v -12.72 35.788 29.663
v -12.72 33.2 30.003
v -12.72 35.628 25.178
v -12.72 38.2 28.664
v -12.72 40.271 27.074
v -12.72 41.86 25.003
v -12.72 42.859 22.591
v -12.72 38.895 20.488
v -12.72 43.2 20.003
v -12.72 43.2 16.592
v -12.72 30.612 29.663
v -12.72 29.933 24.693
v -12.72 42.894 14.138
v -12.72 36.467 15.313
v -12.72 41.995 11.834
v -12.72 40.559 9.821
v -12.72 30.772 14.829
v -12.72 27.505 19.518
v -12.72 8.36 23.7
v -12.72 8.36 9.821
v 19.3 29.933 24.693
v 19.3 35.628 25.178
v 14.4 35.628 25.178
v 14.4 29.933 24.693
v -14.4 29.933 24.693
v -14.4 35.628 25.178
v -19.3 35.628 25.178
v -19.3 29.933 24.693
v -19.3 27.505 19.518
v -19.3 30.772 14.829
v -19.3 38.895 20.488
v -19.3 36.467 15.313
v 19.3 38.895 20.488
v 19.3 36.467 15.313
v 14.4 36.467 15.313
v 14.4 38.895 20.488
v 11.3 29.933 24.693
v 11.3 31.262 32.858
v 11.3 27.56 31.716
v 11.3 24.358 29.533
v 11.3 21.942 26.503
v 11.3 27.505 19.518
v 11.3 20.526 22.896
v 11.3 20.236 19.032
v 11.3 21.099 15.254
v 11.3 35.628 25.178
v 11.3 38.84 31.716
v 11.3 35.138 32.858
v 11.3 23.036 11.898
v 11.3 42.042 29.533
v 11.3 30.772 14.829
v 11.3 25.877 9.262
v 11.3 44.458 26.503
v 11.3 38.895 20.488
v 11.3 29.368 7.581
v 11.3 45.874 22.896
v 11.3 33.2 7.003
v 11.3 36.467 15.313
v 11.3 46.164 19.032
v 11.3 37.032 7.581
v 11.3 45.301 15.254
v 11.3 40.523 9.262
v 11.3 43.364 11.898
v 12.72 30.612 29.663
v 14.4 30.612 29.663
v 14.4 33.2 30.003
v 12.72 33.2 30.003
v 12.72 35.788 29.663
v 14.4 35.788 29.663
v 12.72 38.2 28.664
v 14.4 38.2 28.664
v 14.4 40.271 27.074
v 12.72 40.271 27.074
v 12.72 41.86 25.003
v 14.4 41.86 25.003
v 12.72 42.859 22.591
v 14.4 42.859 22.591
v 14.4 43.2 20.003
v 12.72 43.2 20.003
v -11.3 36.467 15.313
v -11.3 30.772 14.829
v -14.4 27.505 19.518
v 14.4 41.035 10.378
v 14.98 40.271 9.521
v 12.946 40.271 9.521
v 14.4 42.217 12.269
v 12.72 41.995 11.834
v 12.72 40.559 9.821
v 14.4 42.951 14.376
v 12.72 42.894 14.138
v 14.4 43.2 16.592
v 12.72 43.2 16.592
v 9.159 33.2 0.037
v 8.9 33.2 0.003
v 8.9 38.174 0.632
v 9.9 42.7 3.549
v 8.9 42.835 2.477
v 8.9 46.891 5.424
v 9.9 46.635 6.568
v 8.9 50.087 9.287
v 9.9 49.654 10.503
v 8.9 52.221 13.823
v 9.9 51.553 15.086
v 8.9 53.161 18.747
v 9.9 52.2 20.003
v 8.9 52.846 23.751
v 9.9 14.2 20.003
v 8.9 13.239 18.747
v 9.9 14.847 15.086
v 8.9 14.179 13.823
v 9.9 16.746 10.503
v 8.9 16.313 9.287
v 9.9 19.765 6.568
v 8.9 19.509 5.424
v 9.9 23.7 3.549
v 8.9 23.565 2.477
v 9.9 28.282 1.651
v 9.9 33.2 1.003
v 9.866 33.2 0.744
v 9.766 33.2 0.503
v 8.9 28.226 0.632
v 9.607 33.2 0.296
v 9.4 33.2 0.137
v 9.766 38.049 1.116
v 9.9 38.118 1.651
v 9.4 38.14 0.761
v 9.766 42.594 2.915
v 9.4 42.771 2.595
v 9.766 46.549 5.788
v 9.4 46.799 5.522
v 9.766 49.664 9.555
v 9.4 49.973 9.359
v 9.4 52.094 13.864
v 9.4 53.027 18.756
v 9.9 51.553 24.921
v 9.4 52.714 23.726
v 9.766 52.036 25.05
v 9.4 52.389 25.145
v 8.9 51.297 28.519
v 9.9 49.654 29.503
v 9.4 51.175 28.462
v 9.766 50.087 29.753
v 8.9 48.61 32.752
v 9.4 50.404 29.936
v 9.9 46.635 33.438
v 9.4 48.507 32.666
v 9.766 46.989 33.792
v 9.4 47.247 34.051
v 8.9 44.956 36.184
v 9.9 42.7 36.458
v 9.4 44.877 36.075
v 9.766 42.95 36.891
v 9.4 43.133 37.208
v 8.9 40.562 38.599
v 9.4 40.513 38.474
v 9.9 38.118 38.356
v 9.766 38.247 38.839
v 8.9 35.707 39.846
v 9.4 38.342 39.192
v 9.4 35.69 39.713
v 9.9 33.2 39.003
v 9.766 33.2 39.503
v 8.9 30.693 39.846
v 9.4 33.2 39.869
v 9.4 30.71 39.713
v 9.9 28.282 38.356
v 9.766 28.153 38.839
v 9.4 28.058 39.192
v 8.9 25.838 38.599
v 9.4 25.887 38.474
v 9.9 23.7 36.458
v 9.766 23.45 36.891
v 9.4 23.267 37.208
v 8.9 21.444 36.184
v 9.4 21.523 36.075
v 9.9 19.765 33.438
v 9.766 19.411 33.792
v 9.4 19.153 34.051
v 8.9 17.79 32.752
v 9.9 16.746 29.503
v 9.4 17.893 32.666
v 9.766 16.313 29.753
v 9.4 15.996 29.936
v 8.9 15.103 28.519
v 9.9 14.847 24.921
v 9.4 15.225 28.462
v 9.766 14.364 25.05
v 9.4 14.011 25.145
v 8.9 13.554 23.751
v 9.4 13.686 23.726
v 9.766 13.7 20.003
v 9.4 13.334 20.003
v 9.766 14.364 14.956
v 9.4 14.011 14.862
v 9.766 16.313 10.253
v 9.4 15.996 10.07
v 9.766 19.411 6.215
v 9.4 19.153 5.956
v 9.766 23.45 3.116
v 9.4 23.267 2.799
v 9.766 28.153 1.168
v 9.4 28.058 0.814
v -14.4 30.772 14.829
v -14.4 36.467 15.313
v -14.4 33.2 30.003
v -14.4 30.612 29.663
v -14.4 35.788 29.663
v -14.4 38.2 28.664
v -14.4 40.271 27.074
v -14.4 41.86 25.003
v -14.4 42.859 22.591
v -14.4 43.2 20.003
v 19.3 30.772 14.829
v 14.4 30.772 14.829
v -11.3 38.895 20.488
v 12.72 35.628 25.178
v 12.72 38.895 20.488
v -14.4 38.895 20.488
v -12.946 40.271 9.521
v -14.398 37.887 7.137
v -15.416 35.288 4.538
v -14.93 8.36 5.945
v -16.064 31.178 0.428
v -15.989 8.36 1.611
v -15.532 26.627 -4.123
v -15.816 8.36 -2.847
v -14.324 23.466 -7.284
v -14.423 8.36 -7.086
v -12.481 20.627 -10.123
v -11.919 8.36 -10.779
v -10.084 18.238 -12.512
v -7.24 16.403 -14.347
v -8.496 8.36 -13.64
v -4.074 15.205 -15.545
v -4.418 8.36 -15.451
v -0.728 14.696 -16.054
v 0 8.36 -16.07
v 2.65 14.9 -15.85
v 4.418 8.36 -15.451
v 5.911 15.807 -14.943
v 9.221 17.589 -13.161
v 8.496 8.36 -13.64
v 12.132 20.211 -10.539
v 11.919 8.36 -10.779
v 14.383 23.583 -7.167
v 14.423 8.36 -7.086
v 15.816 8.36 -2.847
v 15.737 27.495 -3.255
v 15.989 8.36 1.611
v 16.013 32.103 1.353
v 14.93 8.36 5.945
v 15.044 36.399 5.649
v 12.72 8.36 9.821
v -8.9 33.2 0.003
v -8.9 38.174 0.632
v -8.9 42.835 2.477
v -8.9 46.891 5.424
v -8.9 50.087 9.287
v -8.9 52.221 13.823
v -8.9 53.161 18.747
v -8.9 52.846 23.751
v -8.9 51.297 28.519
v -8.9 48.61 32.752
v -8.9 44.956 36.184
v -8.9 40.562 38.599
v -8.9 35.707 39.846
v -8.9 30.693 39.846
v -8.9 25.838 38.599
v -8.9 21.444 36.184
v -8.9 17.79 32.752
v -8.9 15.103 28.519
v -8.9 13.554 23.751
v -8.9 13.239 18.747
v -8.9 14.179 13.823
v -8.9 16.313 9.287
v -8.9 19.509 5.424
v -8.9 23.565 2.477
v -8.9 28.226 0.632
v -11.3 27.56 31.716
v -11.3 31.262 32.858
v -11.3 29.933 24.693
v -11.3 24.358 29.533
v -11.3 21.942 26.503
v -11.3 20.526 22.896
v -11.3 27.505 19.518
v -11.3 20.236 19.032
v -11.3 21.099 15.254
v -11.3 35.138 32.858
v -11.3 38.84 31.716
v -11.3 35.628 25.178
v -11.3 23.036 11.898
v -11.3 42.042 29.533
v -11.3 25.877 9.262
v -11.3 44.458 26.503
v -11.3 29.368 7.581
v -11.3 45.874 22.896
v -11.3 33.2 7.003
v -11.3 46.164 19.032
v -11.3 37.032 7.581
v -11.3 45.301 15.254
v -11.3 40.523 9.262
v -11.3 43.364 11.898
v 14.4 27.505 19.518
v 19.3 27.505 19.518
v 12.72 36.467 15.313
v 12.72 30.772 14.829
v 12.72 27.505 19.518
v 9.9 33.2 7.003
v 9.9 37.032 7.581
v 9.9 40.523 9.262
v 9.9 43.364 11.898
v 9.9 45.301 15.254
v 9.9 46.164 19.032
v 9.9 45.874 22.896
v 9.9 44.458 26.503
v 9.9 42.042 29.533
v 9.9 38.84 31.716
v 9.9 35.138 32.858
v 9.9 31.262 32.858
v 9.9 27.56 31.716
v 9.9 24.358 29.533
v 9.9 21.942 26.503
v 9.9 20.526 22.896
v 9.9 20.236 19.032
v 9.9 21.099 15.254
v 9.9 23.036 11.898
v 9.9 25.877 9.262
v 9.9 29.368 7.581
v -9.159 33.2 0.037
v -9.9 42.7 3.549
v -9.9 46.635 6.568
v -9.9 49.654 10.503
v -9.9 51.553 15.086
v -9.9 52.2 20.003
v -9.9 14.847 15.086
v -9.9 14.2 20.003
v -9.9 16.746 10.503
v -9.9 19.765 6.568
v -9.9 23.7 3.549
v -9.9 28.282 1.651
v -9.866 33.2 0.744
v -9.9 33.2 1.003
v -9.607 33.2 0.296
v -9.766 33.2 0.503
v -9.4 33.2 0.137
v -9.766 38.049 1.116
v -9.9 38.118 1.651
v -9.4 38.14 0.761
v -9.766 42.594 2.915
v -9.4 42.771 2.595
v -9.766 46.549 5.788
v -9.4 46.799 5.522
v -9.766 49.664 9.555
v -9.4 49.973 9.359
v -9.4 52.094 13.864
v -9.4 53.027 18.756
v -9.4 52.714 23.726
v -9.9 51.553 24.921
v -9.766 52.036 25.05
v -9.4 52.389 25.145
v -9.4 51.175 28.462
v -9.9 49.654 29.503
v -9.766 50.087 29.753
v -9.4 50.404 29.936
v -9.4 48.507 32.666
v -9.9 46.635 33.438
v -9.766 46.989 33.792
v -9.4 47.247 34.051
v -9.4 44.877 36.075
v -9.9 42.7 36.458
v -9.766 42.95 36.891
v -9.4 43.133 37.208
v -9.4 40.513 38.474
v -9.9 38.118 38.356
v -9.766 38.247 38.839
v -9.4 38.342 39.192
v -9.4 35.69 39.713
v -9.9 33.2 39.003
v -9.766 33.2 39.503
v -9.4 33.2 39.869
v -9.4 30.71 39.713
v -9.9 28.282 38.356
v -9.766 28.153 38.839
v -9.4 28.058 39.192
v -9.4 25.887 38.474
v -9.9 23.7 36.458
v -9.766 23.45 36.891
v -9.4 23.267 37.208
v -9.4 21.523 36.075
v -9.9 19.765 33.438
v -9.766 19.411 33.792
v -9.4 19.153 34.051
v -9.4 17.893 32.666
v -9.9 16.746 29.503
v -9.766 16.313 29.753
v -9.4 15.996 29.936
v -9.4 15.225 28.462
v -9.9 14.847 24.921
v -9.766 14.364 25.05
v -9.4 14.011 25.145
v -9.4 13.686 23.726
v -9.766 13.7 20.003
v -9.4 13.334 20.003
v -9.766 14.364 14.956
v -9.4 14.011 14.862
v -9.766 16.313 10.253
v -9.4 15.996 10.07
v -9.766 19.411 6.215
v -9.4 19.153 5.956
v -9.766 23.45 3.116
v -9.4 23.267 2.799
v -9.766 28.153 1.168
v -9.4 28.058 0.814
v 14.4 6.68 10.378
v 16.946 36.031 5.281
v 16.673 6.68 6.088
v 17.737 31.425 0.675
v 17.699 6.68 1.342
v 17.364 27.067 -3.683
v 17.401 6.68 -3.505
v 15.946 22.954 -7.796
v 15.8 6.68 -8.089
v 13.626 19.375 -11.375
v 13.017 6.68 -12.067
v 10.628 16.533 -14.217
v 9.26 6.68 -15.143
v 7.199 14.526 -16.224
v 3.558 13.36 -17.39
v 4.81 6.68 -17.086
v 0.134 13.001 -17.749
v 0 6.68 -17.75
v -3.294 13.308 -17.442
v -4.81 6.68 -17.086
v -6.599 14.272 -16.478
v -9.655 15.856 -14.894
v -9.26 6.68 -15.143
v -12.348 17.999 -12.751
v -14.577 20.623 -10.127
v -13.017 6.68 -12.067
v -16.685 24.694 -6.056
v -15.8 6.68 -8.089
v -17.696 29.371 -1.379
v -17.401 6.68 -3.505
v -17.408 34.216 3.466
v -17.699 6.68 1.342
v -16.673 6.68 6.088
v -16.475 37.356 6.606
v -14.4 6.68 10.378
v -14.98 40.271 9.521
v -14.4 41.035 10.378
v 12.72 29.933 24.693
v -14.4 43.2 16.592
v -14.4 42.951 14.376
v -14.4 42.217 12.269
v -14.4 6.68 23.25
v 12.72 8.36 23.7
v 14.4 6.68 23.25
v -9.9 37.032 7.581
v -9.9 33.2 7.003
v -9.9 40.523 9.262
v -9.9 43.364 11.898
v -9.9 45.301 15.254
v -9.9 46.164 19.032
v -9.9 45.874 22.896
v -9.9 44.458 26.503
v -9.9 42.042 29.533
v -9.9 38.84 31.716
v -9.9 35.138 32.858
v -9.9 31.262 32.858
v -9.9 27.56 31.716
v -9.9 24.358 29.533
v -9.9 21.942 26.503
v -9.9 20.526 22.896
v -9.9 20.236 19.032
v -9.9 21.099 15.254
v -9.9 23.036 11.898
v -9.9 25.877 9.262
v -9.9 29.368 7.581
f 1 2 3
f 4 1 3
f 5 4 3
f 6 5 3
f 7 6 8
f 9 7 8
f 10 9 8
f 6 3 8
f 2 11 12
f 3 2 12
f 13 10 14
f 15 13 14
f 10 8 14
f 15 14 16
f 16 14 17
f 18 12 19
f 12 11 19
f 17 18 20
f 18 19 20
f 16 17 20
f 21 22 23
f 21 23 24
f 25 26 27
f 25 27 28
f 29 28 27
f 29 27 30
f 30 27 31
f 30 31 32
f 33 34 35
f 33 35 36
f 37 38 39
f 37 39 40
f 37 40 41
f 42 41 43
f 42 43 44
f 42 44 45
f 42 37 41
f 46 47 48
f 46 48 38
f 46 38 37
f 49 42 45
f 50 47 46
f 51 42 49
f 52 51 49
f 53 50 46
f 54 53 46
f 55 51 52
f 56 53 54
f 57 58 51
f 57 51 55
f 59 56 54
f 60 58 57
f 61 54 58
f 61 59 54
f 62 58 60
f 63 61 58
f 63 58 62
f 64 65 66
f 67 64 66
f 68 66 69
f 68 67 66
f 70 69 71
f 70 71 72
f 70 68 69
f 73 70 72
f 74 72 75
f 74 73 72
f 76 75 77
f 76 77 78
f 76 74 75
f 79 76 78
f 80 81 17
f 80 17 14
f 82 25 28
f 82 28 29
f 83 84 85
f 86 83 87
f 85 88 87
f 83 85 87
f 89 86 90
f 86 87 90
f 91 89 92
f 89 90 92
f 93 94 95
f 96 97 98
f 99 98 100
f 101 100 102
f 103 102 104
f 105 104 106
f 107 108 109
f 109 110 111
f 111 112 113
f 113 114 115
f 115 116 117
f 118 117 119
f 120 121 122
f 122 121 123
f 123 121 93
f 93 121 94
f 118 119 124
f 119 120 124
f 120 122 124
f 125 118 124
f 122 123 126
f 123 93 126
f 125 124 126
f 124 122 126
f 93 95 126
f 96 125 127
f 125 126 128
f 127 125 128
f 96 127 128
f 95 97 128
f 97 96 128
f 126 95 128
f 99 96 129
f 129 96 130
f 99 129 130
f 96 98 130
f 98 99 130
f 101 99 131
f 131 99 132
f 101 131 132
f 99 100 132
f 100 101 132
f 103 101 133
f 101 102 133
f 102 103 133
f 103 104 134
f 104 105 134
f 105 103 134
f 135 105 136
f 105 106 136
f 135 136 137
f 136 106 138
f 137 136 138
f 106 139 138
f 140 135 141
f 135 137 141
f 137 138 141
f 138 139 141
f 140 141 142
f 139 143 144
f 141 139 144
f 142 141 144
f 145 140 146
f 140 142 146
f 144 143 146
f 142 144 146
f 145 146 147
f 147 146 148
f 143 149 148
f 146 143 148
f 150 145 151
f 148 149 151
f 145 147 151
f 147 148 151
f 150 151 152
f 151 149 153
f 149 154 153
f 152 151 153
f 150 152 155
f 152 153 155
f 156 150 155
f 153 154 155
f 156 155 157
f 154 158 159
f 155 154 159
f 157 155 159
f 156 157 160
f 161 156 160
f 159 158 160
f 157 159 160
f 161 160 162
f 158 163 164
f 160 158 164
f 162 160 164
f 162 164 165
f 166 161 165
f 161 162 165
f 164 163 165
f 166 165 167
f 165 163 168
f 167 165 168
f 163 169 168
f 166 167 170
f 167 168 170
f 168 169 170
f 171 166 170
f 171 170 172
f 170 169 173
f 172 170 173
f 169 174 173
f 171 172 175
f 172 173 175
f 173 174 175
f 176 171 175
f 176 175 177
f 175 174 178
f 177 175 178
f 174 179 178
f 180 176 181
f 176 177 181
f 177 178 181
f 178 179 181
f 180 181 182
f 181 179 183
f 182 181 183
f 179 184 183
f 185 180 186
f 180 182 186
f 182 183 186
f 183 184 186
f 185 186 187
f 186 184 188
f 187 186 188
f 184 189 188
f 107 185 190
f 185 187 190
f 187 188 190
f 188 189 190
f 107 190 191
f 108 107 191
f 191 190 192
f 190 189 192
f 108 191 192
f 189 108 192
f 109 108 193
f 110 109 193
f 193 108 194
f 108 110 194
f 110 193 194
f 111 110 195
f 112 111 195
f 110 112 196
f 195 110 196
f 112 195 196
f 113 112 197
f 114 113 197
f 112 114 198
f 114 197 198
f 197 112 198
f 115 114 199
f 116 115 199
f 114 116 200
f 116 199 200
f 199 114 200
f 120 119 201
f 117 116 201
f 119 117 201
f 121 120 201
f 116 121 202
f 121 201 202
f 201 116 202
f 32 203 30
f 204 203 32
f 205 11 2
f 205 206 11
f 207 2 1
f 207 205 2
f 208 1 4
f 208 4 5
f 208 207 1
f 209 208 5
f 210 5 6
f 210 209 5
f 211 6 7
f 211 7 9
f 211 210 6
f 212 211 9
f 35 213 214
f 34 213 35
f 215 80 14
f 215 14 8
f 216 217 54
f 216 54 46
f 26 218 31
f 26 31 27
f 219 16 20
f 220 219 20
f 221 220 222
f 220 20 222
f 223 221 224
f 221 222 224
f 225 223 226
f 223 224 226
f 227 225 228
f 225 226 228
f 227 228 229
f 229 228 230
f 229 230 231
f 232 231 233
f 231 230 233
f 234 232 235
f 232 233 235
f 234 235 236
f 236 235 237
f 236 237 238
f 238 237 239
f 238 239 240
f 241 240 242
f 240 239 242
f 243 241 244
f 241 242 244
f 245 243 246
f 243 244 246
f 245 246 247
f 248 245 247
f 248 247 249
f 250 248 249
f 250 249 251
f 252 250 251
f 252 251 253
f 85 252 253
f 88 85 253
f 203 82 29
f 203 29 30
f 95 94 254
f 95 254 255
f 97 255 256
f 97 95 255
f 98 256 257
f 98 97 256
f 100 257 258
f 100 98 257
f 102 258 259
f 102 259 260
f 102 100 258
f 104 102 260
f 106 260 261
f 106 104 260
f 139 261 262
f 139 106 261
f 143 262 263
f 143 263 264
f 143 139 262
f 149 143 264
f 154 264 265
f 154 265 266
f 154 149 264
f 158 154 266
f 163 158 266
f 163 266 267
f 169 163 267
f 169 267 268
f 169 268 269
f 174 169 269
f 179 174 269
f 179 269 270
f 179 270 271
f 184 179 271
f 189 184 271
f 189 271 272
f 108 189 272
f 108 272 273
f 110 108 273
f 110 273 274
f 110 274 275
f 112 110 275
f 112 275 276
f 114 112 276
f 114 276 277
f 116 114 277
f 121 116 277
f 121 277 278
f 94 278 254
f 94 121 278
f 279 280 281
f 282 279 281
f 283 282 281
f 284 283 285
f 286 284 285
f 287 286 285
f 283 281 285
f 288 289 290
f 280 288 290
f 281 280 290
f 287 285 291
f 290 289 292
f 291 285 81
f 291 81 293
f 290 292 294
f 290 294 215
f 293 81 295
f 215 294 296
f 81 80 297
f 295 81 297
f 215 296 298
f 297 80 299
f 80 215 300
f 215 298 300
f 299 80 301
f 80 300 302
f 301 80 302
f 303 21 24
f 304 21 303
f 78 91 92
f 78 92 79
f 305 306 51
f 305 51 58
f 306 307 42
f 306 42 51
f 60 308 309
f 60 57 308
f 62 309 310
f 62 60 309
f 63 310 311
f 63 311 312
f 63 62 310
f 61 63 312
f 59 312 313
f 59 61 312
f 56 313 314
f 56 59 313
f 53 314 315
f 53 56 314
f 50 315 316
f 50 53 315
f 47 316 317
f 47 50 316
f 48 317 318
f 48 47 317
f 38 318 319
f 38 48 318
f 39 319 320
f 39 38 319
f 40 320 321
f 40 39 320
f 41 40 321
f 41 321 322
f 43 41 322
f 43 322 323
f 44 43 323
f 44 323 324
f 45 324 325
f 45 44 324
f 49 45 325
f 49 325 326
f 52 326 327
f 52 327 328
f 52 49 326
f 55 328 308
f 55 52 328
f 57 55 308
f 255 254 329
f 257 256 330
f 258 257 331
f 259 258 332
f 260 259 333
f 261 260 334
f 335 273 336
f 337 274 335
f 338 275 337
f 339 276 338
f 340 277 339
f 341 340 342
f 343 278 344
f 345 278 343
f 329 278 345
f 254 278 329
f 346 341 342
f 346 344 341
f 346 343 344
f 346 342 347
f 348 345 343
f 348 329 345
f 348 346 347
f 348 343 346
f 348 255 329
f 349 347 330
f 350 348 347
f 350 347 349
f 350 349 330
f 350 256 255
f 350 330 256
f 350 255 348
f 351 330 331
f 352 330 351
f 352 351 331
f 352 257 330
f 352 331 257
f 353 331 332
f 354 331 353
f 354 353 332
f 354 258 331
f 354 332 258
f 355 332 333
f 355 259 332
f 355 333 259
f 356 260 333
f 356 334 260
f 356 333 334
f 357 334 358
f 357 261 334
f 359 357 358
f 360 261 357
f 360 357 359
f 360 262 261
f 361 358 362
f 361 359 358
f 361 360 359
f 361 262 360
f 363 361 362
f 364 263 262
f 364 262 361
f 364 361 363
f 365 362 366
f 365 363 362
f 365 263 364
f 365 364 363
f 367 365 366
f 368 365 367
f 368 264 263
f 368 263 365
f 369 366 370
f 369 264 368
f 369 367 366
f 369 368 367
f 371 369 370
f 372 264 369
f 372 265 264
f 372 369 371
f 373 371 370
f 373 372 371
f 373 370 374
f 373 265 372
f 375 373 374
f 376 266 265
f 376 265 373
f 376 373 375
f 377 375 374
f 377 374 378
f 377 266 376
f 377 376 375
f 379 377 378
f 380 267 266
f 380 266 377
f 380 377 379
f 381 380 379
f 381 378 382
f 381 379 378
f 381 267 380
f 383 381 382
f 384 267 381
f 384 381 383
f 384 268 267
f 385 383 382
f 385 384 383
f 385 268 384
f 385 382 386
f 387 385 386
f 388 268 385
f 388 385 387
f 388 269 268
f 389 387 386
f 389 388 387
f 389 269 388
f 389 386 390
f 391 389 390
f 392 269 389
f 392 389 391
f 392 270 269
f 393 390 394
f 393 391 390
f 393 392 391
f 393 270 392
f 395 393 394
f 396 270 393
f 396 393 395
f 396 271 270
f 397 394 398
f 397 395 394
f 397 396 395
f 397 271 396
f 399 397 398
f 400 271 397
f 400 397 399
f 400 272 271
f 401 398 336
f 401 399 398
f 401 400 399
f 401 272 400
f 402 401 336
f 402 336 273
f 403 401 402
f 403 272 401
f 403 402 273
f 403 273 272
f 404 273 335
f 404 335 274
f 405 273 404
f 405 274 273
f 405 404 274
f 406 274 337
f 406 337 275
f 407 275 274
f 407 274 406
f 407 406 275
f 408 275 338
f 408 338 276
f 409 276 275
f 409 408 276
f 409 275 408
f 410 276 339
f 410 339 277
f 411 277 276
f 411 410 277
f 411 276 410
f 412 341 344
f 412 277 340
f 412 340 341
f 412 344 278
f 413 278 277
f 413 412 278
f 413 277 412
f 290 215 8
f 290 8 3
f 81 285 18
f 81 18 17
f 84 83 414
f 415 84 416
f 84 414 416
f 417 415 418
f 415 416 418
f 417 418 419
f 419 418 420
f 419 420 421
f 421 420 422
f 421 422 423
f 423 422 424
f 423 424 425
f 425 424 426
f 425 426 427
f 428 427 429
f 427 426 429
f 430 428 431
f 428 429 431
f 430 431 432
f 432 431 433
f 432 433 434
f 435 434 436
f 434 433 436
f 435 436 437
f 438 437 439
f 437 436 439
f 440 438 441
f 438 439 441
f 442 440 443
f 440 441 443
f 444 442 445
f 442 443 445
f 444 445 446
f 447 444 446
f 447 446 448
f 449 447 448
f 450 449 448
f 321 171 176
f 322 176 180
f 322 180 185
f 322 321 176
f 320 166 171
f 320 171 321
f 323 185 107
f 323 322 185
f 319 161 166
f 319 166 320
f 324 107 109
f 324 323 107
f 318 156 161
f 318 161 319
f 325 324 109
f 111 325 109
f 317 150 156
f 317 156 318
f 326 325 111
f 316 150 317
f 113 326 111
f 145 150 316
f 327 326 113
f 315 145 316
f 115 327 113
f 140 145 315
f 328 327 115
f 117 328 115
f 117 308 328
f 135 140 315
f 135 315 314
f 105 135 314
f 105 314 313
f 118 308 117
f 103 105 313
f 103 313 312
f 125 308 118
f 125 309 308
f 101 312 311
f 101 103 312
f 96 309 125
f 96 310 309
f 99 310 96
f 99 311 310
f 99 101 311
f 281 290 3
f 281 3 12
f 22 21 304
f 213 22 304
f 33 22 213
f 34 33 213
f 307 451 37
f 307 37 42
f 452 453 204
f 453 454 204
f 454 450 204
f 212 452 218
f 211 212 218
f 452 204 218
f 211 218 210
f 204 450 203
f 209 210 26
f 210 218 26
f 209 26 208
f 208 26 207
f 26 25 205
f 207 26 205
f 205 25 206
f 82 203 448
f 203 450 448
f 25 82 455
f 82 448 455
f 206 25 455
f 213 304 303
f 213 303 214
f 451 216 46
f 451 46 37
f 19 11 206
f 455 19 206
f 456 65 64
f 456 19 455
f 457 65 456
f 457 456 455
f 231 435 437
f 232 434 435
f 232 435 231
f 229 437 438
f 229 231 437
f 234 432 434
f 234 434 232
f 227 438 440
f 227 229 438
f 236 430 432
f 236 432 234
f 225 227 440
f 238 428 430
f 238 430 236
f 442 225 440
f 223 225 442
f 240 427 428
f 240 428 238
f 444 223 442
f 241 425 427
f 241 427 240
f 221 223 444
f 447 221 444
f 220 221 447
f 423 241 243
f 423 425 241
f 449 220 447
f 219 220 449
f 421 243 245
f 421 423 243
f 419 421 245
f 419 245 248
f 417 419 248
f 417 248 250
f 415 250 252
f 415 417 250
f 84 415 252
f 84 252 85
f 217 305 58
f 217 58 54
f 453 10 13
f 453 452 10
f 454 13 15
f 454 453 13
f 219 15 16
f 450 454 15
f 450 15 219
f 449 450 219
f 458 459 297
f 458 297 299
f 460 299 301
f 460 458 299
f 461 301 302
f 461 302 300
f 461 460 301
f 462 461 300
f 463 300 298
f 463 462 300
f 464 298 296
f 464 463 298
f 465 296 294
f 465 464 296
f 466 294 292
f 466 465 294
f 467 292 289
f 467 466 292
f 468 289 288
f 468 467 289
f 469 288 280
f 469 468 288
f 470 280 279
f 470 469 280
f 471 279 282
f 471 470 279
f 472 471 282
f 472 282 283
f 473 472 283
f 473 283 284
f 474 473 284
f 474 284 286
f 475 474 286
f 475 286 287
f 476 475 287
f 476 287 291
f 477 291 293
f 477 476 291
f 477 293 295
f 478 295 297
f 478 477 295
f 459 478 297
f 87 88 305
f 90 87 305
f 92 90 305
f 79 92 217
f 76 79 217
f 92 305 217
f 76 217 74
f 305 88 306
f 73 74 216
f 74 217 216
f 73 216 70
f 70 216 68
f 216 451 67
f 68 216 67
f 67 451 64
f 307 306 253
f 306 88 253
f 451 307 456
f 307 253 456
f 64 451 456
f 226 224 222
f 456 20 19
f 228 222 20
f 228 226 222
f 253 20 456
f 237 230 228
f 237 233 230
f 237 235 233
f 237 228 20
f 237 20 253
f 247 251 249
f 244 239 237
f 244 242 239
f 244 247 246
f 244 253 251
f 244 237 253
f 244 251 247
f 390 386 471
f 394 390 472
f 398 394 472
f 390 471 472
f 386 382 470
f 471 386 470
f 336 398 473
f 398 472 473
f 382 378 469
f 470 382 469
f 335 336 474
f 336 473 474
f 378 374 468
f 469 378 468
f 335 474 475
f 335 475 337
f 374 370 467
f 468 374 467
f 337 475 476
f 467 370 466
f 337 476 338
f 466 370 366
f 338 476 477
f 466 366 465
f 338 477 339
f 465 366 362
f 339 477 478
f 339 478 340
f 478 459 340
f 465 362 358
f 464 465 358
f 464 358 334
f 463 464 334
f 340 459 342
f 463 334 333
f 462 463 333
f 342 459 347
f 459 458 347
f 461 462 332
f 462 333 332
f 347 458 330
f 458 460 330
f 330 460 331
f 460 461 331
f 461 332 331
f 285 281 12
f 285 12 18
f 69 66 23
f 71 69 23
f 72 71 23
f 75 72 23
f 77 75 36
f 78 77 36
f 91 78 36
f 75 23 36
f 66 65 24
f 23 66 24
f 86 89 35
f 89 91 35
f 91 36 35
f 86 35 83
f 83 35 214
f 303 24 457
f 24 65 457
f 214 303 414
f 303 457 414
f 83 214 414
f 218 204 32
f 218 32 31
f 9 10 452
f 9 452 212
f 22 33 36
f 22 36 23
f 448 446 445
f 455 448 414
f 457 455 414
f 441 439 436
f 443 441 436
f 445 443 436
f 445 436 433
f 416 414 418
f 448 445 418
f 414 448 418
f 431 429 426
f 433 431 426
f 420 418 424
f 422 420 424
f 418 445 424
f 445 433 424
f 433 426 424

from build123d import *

# Parameters (mm, degrees)
EXTRUDE_1_DEPTH       = 1.68
SKETCH_2_R            = 14.75
EXTRUDE_3_DEPTH       = 5
EXTRUDE_4_DEPTH       = 1.68
EXTRUDE_5_DEPTH       = 40
CUT_EXTRUDE_1_DEPTH   = 30
FILLET_1_R            = 10
SKETCH_6_R            = 20
EXTRUDE_6_DEPTH       = 9.9
SKETCH_7_R            = 13
EXTRUDE_7_DEPTH       = 11.3
EXTRUDE_8_DEPTH       = 19.3
FILLET_2_R            = 1
SKETCH_9_W            = 67.955976502
SKETCH_9_H            = 118.115360496
CUT_EXTRUDE_1_2_DEPTH = 6.68


with BuildPart() as part:
    # 草图1 → 凸台-拉伸1 (new body)
    with BuildSketch(Plane(origin=(0, 0, 0), x_dir=(1, 0, 0), z_dir=(0, 1, 0))):
        with BuildLine():
            ThreePointArc((-21.5, 23.6), (-19.6254834, 28.1254834), (-15.1, 30))
            Line((-15.1, 30), (15.1, 30))
            ThreePointArc((15.1, 30), (19.6254834, 28.1254834), (21.5, 23.6))
            Line((21.5, 23.6), (21.5, -23.6))
            ThreePointArc((21.5, -23.6), (19.6254834, -28.1254834), (15.1, -30))
            Line((15.1, -30), (-15.1, -30))
            ThreePointArc((-15.1, -30), (-19.6254834, -28.1254834), (-21.5, -23.6))
            Line((-21.5, -23.6), (-21.5, 23.6))
        make_face()
        with BuildLine():
            ThreePointArc((-18.2, -23.95), (-15, -27.15), (-11.8, -23.95))
            Line((-11.8, -23.95), (-11.8, -21.05))
            ThreePointArc((-11.8, -21.05), (-15, -17.85), (-18.2, -21.05))
            Line((-18.2, -21.05), (-18.2, -23.95))
        make_face(mode=Mode.SUBTRACT)
        with BuildLine():
            ThreePointArc((18.2, -21.05), (15, -17.85), (11.8, -21.05))
            Line((11.8, -21.05), (11.8, -23.95))
            ThreePointArc((11.8, -23.95), (15, -27.15), (18.2, -23.95))
            Line((18.2, -23.95), (18.2, -21.05))
        make_face(mode=Mode.SUBTRACT)
        with BuildLine():
            ThreePointArc((18.2, 23.95), (15, 27.15), (11.8, 23.95))
            Line((11.8, 23.95), (11.8, 21.05))
            ThreePointArc((11.8, 21.05), (15, 17.85), (18.2, 21.05))
            Line((18.2, 21.05), (18.2, 23.95))
        make_face(mode=Mode.SUBTRACT)
        with BuildLine():
            ThreePointArc((-18.2, 21.05), (-15, 17.85), (-11.8, 21.05))
            Line((-11.8, 21.05), (-11.8, 23.95))
            ThreePointArc((-11.8, 23.95), (-15, 27.15), (-18.2, 23.95))
            Line((-18.2, 23.95), (-18.2, 21.05))
        make_face(mode=Mode.SUBTRACT)
    extrude(amount=EXTRUDE_1_DEPTH)

    # 草图2 → 凸台-拉伸3 (add)
    with BuildSketch(Plane(origin=(0, 1.68, 0), x_dir=(1, 0, 0), z_dir=(0, 1, 0))):
        Circle(SKETCH_2_R)
    extrude(amount=EXTRUDE_3_DEPTH)

    # 草图3 → 凸台-拉伸4 (add)
    with BuildSketch(Plane(origin=(0, 6.68, 0), x_dir=(1, 0, 0), z_dir=(0, 1, 0))):
        with BuildLine():
            Line((-14.4, -10.377981499), (-14.4, -50))
            Line((-14.4, -50), (14.4, -50))
            Line((14.4, -50), (14.4, -10.377981499))
            ThreePointArc((14.4, -10.377981499), (0, 17.75), (-14.4, -10.377981499))
        make_face()
    extrude(amount=EXTRUDE_4_DEPTH)

    # 草图4 → 凸台-拉伸5 (add)
    with BuildSketch(Plane(origin=(0, 8.36, 0), x_dir=(1, 0, 0), z_dir=(0, 1, 0))):
        with BuildLine():
            Line((-14.4, -50), (-12.72, -50))
            Line((-12.72, -50), (-12.72, -9.820717896))
            ThreePointArc((-12.72, -9.820717896), (0, 16.07), (12.72, -9.820717896))
            Line((12.72, -9.820717896), (12.72, -50))
            Line((12.72, -50), (14.4, -50))
            Line((14.4, -50), (14.4, -10.377981499))
            ThreePointArc((14.4, -10.377981499), (0, 17.75), (-14.4, -10.377981499))
            Line((-14.4, -10.377981499), (-14.4, -50))
        make_face()
    extrude(amount=EXTRUDE_5_DEPTH)

    # 草图5 → Cut-Extrude 1 (cut, symmetric)
    with BuildSketch(Plane(origin=(0, 0, 0), x_dir=(0, 0, -1), z_dir=(1, 0, 0))):
        Polygon((24.967425324, 5.782574676), (-12.45, 43.2), (-33.035504508, 43.2), (-22.754734371, 4.83164351), (-61.391767423, -5.521118294), (-85.164519421, 83.2), (4.118542495, 83.2), (53.251696571, 34.066845924), align=None)
    extrude(amount=CUT_EXTRUDE_1_DEPTH, both=True, mode=Mode.SUBTRACT)

    # 圆角1
    fillet_1_edges = [part.edges().sort_by_distance(p)[0] for p in [
        (-13.56, 43.2, 33.035504508),
        (-13.56, 43.2, 12.45),
        (13.56, 43.2, 12.45),
        (13.56, 43.2, 33.035504508),
    ]]
    fillet(fillet_1_edges, radius=FILLET_1_R)



with BuildPart() as body_2:
    # 草图6 → 凸台-拉伸6 (new body, symmetric)
    with BuildSketch(Plane(origin=(0, 0, 0), x_dir=(0, 0, -1), z_dir=(1, 0, 0))):
        with Locations((-20.003250779, 33.2)):
            Circle(SKETCH_6_R)
    extrude(amount=EXTRUDE_6_DEPTH, both=True)

    # 草图7 → 凸台-拉伸7 (add, symmetric)
    with BuildSketch(Plane(origin=(0, 0, 0), x_dir=(0, 0, -1), z_dir=(1, 0, 0))):
        with Locations((-20.003250779, 33.2)):
            Circle(SKETCH_7_R)
    extrude(amount=EXTRUDE_7_DEPTH, both=True)


with BuildPart() as part_1:
    add(part.part)

    add(body_2.part)  # 凸台-拉伸8 merges body 2
    # 草图8 → 凸台-拉伸8 (add, symmetric)
    with BuildSketch(Plane(origin=(0, 0, 0), x_dir=(0, 0, -1), z_dir=(1, 0, 0))):
        Polygon((-24.693031377, 29.932591556), (-19.518482361, 27.504826642), (-14.828701763, 30.772235086), (-15.313470181, 36.467408444), (-20.488019197, 38.895173358), (-25.177799795, 35.627764914), align=None)
    extrude(amount=EXTRUDE_8_DEPTH, both=True)

    # 圆角2
    fillet_2_edges = [part_1.edges().sort_by_distance(p)[0] for p in [
        (-9.9, 33.2, 40.003250779),
        (9.9, 33.2, 40.003250779),
    ]]
    fillet(fillet_2_edges, radius=FILLET_2_R)

    # 草图9 → Cut-Extrude 1 2 (cut)
    with BuildSketch(Plane.XZ):
        Rectangle(SKETCH_9_W, SKETCH_9_H)
    extrude(amount=-CUT_EXTRUDE_1_2_DEPTH, mode=Mode.SUBTRACT)


solid = part_1.part
